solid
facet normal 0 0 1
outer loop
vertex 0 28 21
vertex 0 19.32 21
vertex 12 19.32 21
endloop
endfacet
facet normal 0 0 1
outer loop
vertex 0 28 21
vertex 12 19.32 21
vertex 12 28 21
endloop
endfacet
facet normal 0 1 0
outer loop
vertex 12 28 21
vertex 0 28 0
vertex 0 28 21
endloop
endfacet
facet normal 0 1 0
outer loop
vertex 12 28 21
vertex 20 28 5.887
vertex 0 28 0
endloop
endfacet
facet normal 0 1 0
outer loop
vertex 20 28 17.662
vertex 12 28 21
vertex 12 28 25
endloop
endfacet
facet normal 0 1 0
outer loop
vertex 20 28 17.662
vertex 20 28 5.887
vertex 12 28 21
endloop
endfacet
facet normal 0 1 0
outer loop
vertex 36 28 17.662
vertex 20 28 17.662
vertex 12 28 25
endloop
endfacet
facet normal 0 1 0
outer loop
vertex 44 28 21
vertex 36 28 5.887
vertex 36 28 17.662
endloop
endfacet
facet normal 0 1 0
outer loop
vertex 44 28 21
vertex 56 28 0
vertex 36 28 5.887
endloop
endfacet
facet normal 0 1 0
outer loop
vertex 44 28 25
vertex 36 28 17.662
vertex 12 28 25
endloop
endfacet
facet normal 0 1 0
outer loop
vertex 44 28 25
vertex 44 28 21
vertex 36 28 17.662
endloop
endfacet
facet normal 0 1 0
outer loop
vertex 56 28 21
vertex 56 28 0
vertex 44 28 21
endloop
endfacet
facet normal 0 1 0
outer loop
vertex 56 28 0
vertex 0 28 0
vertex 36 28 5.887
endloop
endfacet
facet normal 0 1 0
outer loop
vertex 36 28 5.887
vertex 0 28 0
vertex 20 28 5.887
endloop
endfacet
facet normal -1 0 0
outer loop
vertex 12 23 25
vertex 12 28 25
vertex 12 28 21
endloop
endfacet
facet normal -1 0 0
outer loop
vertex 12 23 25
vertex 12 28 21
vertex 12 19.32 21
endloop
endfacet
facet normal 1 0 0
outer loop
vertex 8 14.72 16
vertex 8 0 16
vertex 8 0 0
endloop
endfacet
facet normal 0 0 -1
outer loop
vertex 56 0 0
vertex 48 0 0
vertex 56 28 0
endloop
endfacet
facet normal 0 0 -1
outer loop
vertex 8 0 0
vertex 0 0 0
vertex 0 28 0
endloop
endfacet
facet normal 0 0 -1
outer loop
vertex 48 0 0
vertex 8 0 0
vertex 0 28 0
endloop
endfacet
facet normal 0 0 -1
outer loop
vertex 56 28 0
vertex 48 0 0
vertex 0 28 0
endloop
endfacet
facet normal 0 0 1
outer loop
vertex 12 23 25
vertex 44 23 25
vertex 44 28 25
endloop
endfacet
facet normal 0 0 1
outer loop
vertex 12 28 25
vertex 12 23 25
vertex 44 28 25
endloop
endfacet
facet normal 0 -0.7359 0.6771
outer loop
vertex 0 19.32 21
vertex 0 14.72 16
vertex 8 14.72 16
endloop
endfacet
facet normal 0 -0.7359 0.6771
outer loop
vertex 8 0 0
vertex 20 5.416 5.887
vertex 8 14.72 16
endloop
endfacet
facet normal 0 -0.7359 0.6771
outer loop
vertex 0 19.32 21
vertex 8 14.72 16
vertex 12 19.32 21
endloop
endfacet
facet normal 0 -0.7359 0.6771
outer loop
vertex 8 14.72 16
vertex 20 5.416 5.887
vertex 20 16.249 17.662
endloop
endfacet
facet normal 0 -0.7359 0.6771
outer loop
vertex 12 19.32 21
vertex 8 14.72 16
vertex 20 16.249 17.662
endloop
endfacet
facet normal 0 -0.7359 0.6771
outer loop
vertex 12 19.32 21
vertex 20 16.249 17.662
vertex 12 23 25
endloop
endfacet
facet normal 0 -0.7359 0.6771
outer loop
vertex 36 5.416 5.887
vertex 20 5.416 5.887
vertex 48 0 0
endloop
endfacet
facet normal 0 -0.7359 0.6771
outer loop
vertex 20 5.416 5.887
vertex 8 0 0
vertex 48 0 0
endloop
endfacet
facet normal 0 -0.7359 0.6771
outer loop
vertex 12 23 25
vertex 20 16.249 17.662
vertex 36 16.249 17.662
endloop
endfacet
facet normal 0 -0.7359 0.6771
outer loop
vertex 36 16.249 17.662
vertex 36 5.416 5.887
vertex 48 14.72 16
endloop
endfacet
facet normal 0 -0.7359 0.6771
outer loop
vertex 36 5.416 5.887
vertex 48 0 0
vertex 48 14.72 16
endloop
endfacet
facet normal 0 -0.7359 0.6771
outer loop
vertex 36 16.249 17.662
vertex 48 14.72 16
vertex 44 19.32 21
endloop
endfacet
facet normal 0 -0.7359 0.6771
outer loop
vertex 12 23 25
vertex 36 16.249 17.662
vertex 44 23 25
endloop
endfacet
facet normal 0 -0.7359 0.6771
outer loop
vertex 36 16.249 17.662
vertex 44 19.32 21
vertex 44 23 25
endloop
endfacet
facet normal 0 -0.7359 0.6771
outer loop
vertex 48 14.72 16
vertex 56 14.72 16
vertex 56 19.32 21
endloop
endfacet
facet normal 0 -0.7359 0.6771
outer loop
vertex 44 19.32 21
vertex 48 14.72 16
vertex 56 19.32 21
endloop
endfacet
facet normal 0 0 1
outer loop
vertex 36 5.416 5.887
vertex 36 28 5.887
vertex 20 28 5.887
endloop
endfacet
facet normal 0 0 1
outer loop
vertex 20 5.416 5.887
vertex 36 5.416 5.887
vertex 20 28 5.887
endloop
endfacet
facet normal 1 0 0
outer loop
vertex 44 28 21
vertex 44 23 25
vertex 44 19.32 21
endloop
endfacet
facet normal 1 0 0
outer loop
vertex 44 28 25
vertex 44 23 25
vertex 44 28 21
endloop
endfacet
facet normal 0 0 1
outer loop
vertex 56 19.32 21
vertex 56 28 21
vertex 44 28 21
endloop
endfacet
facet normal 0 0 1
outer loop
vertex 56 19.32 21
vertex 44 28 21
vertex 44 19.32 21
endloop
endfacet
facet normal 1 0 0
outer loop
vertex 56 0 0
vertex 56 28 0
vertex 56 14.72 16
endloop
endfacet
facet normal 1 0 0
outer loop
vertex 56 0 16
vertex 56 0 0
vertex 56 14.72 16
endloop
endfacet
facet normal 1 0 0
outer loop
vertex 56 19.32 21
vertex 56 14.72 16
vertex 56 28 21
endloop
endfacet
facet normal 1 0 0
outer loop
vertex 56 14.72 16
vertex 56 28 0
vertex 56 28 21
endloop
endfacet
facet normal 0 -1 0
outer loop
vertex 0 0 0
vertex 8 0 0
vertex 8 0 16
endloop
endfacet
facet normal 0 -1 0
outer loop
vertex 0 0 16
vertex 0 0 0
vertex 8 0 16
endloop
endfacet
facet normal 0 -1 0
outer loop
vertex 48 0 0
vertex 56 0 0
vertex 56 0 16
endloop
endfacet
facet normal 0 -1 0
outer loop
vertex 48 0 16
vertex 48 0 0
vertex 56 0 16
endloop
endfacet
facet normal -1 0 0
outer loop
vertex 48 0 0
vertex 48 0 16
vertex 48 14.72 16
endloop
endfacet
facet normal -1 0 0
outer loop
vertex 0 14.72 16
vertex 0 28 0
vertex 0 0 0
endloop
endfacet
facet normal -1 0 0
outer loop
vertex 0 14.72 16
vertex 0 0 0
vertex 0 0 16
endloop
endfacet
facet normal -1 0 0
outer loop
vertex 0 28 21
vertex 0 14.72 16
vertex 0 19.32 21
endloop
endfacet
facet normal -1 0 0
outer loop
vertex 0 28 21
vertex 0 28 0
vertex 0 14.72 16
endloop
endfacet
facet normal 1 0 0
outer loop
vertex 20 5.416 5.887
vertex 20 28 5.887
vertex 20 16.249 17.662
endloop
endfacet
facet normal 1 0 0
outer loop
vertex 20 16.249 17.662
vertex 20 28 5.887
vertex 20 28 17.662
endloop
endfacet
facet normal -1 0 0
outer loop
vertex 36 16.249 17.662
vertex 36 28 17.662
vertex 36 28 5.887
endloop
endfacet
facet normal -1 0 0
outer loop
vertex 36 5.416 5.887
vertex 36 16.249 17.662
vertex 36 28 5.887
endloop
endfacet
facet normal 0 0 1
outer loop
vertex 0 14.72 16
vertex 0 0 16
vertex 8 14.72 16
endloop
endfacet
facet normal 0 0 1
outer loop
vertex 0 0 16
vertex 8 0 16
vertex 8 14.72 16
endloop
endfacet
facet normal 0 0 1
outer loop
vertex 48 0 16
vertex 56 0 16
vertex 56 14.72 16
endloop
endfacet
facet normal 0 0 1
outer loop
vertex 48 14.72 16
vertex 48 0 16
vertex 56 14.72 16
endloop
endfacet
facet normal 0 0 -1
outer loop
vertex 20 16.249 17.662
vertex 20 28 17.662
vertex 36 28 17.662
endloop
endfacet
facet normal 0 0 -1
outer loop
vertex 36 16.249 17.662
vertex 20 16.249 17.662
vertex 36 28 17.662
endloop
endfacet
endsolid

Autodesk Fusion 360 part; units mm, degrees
sketch "Sketch1" plane through (0, 0, 0) normal (0, 0, 1) x (1, 0, 0)
box "BoxPrimitive1" add length 28 width 56 height 25 placed x (0, 1, 0) y (-1, 0, 0) z (0, 0, 1) at (56, 0, 0)
sketch "Sketch2" plane through (56, 0, 0) normal (1, 0, 0) x (0, 1, 0)
  line L0 (0, 25) -> (0, 0)
  line L1 (0, 0) -> (28, 0)
  line L2 (28, 0) -> (28, 25)
  line L3 (28, 25) -> (0, 25)
  line L4 (0, 0) -> (23, 25)
  line L5 (28, 21) -> (19.32, 21)
  line L6 (0, 16) -> (14.72, 16)
  dimension "d6" = 5
  dimension "d7" = 16
  dimension "d8" = 5
extrude "Extrude1" cut sketch "Sketch2" against normal blind 56 contours L0 L3 L4 L6
extrude "Extrude2" cut sketch "Sketch2" against normal blind 40 from surface at -8 contours L0 L4 L6
extrude "Extrude3" cut sketch "Sketch2" against normal blind 12 contours L2 L3 L4 L5
ref_plane "WorkPlane1" through (28, 14, 12.5) normal (-1, 0, 0) x (0, 0, 1)
mirror "Mirror1" about plane through (28, 14, 12.5) normal (-1, 0, 0) of "Extrude3"
sketch "Sketch3" plane through (0, 0, 0) normal (0, -0.735931, 0.677057) x (1, 0, 0)
  line L0 (12, 28.5353) -> (0, 28.5353)
  line L1 (0, 28.5353) -> (0, 21.7412)
  line L2 (0, 21.7412) -> (8, 21.7412)
  line L3 (8, 21.7412) -> (8, 0)
  line L4 (8, 0) -> (48, 0)
  line L5 (48, 0) -> (48, 21.7412)
  line L6 (48, 21.7412) -> (56, 21.7412)
  line L7 (56, 21.7412) -> (56, 28.5353)
  line L8 (56, 28.5353) -> (44, 28.5353)
  line L9 (44, 28.5353) -> (44, 33.9706)
  line L10 (44, 33.9706) -> (12, 33.9706)
  line L11 (12, 33.9706) -> (12, 28.5353)
  line L12 (20, 24) -> (36, 24)
  line L13 (36, 24) -> (36, 8)
  line L14 (36, 8) -> (20, 8)
  line L15 (20, 8) -> (20, 24)
  dimension "d18" = 16
  dimension "d19" = 16
  dimension "d20" = 8
  dimension "d21" = 12
sketch "Sketch4" plane through (0, 28, 0) normal (0, 1, 0) x (-1, 0, 0)
  line L0 (0, 21) -> (-12, 21)
  line L1 (-12, 21) -> (-12, 25)
  line L2 (-12, 25) -> (-44, 25)
  line L3 (-44, 25) -> (-44, 21)
  line L4 (-44, 21) -> (-56, 21)
  line L5 (-56, 21) -> (-56, 0)
  line L6 (-56, 0) -> (0, 0)
  line L7 (0, 0) -> (0, 21)
  line L8 (-36, 5.8874) -> (-20, 5.8874)
  line L9 (-20, 5.8874) -> (-20, 17.6623)
  line L10 (-36, 17.6623) -> (-36, 5.8874)
  line L11 (-20, 17.6623) -> (-36, 17.6623)
extrude "Extrude4" cut sketch "Sketch4" against normal blind 28 contours L8 L9 L10 L11
